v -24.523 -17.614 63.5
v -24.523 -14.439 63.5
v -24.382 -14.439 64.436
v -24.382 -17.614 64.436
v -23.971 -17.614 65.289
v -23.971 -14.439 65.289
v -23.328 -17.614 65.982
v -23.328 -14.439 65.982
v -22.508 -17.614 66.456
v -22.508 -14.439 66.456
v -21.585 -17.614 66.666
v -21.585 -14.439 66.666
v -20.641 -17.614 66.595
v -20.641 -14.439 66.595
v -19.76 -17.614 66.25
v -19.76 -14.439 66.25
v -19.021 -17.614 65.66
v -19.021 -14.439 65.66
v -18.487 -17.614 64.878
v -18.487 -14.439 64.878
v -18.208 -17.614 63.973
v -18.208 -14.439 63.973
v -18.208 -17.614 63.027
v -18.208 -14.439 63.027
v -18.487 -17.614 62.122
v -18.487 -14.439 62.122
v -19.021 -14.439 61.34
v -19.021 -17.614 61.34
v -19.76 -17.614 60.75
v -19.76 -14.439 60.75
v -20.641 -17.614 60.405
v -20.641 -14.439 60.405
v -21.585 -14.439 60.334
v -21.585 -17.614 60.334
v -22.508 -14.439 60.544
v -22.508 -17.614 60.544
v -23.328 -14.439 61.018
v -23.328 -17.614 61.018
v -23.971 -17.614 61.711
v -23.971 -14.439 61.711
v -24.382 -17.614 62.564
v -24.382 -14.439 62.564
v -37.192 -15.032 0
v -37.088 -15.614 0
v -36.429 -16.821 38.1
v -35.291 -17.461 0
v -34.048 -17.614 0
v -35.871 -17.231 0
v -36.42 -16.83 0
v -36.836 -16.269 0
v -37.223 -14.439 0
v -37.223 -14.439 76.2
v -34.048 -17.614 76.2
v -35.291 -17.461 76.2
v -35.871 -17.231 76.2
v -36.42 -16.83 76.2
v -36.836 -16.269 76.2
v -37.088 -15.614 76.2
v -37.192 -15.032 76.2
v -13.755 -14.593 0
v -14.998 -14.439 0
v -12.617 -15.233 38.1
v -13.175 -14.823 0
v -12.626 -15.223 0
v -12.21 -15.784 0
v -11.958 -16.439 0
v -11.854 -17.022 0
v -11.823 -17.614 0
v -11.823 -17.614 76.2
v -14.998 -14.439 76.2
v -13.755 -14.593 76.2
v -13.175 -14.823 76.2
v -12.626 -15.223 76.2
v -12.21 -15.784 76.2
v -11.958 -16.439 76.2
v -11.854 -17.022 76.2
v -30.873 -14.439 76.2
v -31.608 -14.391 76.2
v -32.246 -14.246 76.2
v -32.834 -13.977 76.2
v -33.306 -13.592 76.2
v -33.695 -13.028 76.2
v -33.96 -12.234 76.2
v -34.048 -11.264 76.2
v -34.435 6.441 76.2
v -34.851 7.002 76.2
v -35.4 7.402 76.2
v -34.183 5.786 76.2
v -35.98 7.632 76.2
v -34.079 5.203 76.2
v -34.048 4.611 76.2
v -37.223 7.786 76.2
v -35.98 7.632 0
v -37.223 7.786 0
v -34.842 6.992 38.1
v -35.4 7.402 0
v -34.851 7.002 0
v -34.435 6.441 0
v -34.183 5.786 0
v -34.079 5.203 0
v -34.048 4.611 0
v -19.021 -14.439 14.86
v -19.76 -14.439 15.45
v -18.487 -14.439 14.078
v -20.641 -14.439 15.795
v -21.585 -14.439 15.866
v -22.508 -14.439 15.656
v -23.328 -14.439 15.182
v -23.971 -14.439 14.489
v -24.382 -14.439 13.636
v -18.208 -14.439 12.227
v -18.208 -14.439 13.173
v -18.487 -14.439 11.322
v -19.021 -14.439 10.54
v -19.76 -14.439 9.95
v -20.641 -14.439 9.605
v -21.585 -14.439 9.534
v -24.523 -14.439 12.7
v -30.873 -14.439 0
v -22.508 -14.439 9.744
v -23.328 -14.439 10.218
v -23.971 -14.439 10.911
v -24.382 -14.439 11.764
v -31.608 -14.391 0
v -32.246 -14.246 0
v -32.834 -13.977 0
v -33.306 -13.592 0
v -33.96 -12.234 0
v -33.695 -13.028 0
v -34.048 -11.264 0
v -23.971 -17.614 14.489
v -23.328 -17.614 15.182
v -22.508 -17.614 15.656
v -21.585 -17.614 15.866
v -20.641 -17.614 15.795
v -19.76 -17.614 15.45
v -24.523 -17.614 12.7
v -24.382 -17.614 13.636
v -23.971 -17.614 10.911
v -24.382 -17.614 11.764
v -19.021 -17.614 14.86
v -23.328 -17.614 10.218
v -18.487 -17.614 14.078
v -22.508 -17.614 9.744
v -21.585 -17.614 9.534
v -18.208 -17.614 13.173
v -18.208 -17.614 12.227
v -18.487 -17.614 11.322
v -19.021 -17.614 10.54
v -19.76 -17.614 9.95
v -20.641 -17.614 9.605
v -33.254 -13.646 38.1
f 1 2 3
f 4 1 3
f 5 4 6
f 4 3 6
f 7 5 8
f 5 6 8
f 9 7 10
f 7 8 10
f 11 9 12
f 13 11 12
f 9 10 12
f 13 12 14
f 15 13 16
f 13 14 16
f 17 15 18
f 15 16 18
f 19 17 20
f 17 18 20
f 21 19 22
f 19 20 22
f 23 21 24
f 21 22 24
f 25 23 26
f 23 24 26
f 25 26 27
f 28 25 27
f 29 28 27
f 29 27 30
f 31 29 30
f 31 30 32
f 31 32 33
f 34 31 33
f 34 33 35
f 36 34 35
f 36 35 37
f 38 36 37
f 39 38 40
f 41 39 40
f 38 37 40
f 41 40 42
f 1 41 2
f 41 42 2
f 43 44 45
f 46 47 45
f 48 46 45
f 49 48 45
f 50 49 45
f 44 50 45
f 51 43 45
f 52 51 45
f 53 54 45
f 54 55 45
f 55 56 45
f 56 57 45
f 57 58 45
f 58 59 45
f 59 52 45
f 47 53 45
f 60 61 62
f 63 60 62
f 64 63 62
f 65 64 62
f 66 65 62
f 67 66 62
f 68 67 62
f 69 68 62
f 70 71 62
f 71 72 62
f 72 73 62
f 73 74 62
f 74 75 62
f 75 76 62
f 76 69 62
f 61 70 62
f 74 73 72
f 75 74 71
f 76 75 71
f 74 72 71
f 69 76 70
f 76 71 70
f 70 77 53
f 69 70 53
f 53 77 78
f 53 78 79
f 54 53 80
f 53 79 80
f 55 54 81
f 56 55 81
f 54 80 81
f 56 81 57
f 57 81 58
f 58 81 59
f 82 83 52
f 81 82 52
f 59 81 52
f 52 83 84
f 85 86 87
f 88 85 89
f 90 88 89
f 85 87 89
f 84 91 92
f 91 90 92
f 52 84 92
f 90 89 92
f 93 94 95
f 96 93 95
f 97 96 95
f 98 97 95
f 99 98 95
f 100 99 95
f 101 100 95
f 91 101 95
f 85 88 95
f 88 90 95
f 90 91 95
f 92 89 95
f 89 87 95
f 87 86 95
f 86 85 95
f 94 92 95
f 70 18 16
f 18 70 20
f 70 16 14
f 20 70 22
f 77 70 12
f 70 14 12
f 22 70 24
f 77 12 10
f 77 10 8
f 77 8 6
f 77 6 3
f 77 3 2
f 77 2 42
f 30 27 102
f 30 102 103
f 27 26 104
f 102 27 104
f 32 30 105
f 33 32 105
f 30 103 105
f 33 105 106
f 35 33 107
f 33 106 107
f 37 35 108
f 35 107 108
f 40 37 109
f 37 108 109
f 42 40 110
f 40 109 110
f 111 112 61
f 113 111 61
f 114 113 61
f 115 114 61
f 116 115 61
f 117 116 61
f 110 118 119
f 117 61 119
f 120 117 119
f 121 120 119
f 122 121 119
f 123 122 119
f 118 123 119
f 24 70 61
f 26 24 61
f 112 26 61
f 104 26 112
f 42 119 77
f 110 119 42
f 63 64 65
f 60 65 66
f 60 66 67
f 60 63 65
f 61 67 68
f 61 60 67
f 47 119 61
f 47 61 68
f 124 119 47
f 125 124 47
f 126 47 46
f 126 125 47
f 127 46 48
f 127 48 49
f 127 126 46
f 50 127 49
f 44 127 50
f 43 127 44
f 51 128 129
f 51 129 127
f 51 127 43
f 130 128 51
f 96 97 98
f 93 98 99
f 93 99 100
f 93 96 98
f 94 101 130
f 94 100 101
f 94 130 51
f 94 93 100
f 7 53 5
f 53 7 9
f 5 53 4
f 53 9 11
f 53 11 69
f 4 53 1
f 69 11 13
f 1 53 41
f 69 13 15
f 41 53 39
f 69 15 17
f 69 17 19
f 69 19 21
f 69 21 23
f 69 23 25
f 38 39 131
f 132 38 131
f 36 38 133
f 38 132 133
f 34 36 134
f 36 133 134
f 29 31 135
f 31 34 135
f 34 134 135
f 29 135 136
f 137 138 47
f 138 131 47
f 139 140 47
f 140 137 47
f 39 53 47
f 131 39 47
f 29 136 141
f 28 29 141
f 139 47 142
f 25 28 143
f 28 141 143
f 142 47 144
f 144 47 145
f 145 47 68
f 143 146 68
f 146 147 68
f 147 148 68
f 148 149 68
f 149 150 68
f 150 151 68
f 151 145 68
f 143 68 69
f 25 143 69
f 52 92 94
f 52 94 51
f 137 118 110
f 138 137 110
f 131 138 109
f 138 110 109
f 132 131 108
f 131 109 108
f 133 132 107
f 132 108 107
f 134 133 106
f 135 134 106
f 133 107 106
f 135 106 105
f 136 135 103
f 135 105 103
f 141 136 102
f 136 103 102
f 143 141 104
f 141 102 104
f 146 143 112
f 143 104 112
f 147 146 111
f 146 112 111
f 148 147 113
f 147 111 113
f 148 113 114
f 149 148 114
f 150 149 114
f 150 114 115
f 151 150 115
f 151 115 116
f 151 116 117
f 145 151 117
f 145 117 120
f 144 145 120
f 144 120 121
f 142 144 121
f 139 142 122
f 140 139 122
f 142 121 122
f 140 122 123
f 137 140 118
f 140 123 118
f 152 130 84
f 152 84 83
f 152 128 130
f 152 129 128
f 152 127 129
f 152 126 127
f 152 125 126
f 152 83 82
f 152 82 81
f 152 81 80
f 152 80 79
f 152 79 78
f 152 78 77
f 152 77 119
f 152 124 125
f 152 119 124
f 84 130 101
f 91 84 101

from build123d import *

# Parameters (mm, degrees)
F1_DEPTH    = 76.2
F2_R        = 3.175
F3_DEPTH    = 3.175
F4_T1_DEPTH = 76.2
F4_T3_DEPTH = 92.075


# Not quite as in the source:
# - a fillet or chamfer that OpenCascade refuses, or shapes differently, is made with other operations: its cross-section is extruded or revolved along the edge and cut away or added


with BuildPart() as f1:
    # F0 (on Top) → F1 (new body)
    with BuildSketch(Plane.XY):
        Polygon((-34.0479501394, 7.7857396193), (-37.2229501394, 7.7857396193), (-37.2229501394, -17.6142603807), (-11.8229501394, -17.6142603807), (-11.8229501394, -14.4392603807), (-34.0479501394, -14.4392603807), align=None)
    extrude(amount=F1_DEPTH)

    # F2 (on face) → F3 (cut)
    with BuildSketch(Plane(origin=(0, -14.4392603807, 0), x_dir=(-1, 0, 0), z_dir=(0, 1, 0))):
        with Locations((21.3479501394, 63.5)):
            Circle(F2_R)
        with Locations((21.3479501394, 12.7)):
            Circle(F2_R)
    extrude(amount=-F3_DEPTH, mode=Mode.SUBTRACT)

    # F4: fillet of radius 3.175 on 4 edges, made by hand

    # F4_s2 → F4_t1 (join)
    with BuildSketch(Plane.XY):
        with BuildLine():
            add(Edge.make_bspline(
                [(-34.0479501394, -11.2642603807), (-34.0479501394, -14.4392603807), (-30.8729501394, -14.4392603807)],
                knots=[0, 0, 0, 1, 1, 1], degree=2, weights=[1, 1, 1]))
            Line((-30.8729501394, -14.4392603807), (-34.0479501394, -14.4392603807))
            Line((-34.0479501394, -14.4392603807), (-34.0479501394, -11.2642603807))
        make_face()
    extrude(amount=F4_T1_DEPTH)

    # F4_s4 → F4_t3 (cut)
    with BuildSketch(Plane.XY.offset(-7.9375)):
        with BuildLine():
            add(Edge.make_bspline(
                [(-11.8229501394, -17.6142603807), (-11.8229501394, -14.4392603807), (-14.9979501394, -14.4392603807)],
                knots=[0, 0, 0, 1, 1, 1], degree=2, weights=[1, 1, 1]))
            Line((-14.9979501394, -14.4392603807), (-11.8229501394, -14.4392603807))
            Line((-11.8229501394, -14.4392603807), (-11.8229501394, -17.6142603807))
        make_face()
        with BuildLine():
            add(Edge.make_bspline(
                [(-34.0479501394, 4.6107396193), (-34.0479501394, 7.7857396193), (-37.2229501394, 7.7857396193)],
                knots=[0, 0, 0, 1, 1, 1], degree=2, weights=[1, 1, 1]))
            Line((-37.2229501394, 7.7857396193), (-34.0479501394, 7.7857396193))
            Line((-34.0479501394, 7.7857396193), (-34.0479501394, 4.6107396193))
        make_face()
        with BuildLine():
            add(Edge.make_bspline(
                [(-37.2229501394, -14.4392603807), (-37.2229501394, -17.6142603807), (-34.0479501394, -17.6142603807)],
                knots=[0, 0, 0, 1, 1, 1], degree=2, weights=[1, 1, 1]))
            Line((-34.0479501394, -17.6142603807), (-37.2229501394, -17.6142603807))
            Line((-37.2229501394, -17.6142603807), (-37.2229501394, -14.4392603807))
        make_face()
    extrude(amount=F4_T3_DEPTH, mode=Mode.SUBTRACT)


solid = f1.part
